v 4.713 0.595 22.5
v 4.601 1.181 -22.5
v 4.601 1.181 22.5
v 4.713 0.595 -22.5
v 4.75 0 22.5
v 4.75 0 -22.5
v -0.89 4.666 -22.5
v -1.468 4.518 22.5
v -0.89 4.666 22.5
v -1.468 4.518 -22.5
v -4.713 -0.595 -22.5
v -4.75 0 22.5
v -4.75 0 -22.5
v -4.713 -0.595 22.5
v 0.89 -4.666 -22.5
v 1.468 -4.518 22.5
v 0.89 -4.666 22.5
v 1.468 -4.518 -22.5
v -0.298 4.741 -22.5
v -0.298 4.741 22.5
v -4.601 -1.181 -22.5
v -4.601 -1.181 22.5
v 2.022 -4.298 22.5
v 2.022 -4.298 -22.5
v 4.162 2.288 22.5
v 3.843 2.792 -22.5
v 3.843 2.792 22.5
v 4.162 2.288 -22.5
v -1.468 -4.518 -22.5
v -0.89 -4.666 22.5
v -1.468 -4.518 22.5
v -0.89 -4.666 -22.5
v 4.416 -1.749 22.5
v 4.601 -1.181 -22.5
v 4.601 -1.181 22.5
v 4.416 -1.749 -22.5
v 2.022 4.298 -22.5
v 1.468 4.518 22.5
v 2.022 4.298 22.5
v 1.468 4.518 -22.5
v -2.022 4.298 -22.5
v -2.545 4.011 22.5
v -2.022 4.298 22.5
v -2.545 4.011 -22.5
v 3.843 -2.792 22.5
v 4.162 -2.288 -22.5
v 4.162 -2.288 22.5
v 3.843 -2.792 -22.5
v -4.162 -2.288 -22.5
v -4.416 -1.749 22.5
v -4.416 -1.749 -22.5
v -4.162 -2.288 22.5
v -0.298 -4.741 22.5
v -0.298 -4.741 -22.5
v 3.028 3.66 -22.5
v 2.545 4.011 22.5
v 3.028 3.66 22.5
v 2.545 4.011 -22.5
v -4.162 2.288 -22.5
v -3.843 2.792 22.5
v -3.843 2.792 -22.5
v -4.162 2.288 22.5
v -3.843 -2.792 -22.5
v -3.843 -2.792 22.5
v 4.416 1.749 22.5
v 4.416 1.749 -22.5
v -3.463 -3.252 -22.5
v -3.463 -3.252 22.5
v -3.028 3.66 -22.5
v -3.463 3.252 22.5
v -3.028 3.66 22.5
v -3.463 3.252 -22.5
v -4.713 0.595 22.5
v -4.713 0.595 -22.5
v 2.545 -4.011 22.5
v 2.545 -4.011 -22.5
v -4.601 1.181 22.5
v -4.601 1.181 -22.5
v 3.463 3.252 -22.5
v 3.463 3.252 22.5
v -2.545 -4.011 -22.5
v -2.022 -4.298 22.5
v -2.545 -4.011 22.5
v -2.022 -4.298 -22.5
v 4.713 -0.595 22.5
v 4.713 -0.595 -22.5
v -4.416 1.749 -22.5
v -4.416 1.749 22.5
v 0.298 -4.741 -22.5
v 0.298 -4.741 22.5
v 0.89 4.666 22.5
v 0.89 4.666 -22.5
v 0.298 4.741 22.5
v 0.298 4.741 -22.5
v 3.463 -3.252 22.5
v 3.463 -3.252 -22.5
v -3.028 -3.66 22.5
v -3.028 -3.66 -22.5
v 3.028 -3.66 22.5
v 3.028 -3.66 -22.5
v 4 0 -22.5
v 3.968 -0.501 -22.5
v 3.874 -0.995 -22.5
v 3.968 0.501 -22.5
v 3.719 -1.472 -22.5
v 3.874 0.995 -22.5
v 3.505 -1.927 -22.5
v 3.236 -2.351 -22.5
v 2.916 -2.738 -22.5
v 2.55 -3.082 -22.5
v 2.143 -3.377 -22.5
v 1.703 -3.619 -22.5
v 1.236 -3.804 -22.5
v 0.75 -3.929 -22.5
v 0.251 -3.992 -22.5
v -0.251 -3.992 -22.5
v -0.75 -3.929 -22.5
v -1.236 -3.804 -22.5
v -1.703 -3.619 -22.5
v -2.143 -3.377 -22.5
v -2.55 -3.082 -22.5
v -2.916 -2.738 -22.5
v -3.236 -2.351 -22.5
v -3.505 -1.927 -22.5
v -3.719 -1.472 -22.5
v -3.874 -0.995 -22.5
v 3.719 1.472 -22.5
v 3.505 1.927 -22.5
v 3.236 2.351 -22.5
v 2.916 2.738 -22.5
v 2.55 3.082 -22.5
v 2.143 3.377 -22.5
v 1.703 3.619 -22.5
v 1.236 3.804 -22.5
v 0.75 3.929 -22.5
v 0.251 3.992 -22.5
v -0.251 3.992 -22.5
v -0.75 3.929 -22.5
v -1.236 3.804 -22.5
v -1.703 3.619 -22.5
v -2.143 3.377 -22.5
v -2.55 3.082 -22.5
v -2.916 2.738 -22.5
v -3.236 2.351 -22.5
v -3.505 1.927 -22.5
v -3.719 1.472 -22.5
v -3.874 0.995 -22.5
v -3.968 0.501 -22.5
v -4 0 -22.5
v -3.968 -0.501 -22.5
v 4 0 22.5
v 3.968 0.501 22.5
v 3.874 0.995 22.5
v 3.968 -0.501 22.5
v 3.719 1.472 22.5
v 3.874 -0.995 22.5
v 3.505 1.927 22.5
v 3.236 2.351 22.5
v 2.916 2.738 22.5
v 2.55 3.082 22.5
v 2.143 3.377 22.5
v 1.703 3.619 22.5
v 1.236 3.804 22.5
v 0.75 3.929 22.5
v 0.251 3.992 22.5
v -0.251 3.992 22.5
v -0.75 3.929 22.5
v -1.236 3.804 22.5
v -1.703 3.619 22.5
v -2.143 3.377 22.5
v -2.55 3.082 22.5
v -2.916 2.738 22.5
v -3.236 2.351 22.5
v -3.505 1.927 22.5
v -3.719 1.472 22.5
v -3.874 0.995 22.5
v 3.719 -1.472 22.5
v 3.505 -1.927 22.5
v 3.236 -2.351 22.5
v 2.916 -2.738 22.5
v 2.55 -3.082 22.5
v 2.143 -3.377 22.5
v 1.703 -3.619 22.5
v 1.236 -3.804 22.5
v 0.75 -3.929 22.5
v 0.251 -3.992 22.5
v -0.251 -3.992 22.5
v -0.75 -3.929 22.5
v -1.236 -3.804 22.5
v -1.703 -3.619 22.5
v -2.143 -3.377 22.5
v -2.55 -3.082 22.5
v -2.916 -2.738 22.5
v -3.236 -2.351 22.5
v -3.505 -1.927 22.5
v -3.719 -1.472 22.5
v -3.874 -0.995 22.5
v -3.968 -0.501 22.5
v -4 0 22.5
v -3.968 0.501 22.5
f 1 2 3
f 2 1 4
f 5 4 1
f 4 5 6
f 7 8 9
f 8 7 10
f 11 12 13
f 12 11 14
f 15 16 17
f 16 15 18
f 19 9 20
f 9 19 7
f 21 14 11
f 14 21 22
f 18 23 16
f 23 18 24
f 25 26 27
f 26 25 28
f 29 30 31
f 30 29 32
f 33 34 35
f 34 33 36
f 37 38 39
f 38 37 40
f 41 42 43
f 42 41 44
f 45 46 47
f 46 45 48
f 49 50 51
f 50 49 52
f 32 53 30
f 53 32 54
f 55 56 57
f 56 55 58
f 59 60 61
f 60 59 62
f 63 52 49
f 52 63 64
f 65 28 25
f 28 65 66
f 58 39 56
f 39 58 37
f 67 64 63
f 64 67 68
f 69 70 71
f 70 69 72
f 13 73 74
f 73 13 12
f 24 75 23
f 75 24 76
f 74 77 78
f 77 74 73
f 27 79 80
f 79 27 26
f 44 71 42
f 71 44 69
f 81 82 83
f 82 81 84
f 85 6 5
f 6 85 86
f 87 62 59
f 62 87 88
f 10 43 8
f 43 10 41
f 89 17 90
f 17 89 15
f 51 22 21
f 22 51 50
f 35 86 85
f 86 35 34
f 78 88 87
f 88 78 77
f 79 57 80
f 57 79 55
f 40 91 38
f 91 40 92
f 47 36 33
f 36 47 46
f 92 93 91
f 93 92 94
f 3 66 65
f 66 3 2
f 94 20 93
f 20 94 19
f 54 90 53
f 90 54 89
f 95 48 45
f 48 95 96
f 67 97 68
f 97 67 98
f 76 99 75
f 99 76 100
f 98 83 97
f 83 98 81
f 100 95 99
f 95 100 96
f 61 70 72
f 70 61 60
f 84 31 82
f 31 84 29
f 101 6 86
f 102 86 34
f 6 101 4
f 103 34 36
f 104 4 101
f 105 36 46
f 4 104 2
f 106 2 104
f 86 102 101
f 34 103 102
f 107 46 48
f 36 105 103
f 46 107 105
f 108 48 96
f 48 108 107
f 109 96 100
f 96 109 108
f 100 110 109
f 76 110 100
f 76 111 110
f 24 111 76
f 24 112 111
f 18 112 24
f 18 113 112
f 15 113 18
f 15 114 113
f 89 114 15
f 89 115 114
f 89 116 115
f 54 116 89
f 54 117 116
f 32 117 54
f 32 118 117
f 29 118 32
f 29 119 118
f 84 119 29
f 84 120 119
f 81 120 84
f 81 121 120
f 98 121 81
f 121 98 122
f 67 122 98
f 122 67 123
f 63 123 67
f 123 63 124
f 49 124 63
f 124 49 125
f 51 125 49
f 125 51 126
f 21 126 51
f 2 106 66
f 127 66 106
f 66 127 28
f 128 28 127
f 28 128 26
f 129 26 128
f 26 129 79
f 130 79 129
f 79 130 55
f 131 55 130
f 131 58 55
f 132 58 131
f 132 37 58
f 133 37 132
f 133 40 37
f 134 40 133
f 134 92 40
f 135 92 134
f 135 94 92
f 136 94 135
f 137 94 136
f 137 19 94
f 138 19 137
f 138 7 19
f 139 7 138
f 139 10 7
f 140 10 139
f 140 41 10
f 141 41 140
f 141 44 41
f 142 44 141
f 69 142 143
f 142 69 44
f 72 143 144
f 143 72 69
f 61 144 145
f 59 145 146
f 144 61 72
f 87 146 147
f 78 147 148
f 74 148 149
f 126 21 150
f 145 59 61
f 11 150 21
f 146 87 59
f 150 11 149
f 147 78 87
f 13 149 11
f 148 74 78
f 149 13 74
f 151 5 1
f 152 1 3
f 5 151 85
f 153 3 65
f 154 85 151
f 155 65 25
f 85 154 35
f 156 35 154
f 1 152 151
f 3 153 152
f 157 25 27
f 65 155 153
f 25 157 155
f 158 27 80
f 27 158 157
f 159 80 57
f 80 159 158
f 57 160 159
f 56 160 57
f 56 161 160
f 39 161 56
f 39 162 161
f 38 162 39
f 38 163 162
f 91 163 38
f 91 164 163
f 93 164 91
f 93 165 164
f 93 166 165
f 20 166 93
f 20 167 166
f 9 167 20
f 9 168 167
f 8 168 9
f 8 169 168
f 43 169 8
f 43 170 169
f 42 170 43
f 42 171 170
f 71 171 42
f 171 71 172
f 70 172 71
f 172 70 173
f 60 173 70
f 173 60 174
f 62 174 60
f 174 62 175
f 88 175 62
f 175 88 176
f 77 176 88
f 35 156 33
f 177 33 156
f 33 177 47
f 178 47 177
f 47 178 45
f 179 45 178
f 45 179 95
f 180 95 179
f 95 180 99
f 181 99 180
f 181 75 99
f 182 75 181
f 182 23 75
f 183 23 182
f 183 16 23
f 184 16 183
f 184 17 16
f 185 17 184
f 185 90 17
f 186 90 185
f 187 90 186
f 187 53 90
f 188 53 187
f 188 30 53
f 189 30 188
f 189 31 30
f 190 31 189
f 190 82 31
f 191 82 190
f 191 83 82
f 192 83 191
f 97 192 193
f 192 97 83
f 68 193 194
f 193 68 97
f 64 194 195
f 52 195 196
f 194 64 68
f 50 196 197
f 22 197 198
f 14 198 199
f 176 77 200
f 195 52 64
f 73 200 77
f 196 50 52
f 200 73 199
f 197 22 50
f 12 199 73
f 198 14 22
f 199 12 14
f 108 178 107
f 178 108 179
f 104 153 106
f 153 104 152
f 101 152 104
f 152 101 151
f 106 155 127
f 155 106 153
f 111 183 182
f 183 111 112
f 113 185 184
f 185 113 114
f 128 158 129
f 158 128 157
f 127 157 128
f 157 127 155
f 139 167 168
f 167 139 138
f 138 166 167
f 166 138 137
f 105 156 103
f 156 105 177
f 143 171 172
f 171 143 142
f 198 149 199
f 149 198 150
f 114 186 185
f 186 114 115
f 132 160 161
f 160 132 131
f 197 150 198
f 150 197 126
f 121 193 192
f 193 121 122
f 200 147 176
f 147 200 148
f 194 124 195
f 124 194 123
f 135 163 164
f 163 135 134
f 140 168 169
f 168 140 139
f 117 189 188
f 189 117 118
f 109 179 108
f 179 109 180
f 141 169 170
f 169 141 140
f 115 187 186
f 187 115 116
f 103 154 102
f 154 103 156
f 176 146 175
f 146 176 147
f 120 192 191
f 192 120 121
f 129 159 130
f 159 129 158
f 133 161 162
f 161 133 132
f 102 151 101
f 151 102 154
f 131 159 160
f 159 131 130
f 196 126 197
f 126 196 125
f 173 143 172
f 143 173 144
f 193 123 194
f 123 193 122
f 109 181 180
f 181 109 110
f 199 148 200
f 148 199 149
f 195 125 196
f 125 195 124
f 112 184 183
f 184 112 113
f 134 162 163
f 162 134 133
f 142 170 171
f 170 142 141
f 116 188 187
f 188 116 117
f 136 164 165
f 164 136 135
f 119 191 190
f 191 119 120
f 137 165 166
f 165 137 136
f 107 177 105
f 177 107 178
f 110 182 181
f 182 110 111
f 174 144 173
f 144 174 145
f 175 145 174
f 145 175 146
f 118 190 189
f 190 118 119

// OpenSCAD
$fn = 50;


difference() {
	union() {
		translate(v = [0, 0, -22.5000000000]) {
			cylinder(h = 45, r = 4.7500000000);
		}
	}
	union() {
		translate(v = [0, 0, -100.0000000000]) {
			cylinder(h = 200, r = 4.0000000000);
		}
	}
}
